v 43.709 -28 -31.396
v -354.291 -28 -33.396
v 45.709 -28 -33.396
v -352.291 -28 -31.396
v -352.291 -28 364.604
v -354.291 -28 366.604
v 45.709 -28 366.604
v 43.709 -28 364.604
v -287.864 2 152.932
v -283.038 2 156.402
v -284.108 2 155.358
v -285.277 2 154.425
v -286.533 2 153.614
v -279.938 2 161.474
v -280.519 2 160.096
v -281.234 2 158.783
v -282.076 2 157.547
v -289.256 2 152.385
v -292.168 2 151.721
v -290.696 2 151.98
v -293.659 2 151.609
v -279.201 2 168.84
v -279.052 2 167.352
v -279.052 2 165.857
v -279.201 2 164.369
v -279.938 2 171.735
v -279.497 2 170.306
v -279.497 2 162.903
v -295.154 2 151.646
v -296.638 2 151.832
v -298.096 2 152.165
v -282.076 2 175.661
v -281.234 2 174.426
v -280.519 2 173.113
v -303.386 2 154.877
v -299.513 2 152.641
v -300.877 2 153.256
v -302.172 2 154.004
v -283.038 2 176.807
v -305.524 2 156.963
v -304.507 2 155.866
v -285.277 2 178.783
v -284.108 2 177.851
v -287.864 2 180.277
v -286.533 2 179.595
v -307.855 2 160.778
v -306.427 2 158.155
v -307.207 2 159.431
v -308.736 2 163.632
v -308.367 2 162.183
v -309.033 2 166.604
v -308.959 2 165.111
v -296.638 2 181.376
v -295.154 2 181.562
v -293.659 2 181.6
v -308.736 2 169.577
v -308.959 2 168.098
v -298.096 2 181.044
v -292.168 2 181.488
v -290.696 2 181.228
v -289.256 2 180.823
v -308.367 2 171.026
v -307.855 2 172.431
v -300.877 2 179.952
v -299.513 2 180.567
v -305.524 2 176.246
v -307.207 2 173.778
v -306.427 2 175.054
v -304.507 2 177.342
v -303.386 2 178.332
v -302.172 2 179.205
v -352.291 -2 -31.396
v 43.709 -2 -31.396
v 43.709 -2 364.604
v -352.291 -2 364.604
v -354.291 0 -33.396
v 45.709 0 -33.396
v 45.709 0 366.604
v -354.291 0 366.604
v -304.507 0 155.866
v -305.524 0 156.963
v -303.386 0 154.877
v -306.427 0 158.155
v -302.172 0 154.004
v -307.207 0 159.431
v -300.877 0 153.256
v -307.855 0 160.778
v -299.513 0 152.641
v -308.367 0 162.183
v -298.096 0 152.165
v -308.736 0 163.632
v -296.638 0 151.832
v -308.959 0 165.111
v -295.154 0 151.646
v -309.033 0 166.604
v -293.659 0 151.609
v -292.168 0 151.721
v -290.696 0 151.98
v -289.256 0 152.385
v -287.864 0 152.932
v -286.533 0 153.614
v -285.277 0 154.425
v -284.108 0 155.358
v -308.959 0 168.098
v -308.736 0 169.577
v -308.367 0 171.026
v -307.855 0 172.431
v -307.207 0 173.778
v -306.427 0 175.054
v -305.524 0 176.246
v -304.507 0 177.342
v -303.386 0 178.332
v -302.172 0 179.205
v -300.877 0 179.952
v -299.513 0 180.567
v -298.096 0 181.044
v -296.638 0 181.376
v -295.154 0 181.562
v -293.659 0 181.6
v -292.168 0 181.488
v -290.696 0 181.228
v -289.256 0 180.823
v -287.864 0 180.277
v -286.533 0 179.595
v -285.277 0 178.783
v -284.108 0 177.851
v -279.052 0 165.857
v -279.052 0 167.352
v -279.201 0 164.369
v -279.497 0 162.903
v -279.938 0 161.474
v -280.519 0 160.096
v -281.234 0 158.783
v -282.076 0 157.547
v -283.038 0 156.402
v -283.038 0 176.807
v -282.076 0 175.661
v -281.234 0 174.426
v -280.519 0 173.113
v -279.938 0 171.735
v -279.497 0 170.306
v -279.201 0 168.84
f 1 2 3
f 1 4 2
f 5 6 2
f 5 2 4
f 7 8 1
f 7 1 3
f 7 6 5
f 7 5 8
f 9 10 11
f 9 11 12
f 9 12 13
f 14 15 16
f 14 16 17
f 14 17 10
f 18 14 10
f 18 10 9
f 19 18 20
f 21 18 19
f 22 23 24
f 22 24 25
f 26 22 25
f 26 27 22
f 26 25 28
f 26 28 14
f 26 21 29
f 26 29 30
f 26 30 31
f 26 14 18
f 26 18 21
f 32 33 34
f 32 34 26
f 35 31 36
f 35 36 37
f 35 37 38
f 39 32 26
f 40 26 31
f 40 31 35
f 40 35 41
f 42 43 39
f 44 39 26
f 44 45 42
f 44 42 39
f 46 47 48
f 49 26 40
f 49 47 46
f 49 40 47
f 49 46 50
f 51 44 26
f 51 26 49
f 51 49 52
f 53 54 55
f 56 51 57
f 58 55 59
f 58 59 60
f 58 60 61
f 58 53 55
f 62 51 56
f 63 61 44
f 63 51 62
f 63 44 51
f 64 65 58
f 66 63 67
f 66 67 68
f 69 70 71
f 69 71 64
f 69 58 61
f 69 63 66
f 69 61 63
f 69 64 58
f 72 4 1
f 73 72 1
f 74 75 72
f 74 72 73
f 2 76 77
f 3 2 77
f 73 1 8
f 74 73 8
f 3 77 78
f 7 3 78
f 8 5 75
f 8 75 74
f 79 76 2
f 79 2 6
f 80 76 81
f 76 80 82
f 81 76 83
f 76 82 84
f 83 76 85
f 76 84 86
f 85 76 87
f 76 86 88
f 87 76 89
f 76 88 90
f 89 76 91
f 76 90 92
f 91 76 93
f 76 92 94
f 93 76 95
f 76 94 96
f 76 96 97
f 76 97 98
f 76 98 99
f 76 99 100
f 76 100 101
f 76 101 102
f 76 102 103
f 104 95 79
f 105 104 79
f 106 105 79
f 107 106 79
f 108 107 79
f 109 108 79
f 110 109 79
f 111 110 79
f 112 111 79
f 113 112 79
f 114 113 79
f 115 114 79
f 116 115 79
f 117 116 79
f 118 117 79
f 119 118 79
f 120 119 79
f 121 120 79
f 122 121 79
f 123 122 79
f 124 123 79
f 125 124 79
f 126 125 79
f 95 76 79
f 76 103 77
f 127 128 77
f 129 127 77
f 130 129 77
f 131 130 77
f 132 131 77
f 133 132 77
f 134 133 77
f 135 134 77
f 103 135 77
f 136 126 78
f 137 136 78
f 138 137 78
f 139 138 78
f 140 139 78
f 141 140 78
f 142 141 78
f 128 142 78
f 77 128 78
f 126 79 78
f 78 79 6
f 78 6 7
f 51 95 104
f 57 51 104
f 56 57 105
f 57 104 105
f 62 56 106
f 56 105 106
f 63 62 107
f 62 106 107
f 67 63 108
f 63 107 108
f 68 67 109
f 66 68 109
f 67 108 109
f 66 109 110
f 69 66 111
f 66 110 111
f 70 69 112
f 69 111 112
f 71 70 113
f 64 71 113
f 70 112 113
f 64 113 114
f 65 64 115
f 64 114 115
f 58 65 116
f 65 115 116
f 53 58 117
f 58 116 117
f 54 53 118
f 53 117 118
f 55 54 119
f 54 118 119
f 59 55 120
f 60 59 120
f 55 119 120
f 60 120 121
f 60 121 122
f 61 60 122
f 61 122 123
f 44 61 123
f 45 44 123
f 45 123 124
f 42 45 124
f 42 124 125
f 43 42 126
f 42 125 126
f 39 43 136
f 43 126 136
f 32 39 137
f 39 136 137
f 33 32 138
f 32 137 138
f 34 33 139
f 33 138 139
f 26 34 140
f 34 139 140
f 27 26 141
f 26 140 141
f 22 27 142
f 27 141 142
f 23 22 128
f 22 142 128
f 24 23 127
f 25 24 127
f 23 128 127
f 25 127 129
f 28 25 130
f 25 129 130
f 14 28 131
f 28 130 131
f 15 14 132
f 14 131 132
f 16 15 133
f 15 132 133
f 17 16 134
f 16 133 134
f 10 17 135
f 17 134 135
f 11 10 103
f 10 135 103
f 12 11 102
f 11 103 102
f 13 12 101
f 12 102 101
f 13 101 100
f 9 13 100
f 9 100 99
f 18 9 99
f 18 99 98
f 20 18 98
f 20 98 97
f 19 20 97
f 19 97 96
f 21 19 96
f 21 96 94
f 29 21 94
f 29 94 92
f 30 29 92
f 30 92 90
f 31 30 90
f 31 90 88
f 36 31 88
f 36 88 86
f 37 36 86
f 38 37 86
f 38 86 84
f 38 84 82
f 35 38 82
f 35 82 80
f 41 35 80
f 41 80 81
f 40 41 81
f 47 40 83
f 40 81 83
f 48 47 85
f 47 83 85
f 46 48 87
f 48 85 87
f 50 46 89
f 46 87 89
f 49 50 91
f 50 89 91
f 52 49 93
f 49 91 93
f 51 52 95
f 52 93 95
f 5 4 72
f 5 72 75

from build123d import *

# Parameters (mm, degrees)
F0_W     = 400
F0_H     = 400
F1_DEPTH = 28
F2_W     = 396
F2_H     = 396
F3_DEPTH = 26
F4_R     = 15
F5_DEPTH = 2


with BuildPart() as f1:
    # F0 (on Front) → F1 (new body)
    with BuildSketch(Plane.XZ):
        with Locations((-154.291336, 166.60433)):
            Rectangle(F0_W, F0_H)
    extrude(amount=F1_DEPTH)

    # F2 (on face) → F3 (cut)
    with BuildSketch(Plane.XZ.offset(28)):
        with Locations((-154.291336, 166.60433)):
            Rectangle(F2_W, F2_H)
    extrude(amount=-F3_DEPTH, mode=Mode.SUBTRACT)

    # F4 (on face) → F5 (join)
    with BuildSketch(Plane(origin=(0, 0, 0), x_dir=(-1, 0, 0), z_dir=(0, 1, 0))):
        with Locations((294.033349, 166.60433)):
            Circle(F4_R)
    extrude(amount=F5_DEPTH)


solid = f1.part
